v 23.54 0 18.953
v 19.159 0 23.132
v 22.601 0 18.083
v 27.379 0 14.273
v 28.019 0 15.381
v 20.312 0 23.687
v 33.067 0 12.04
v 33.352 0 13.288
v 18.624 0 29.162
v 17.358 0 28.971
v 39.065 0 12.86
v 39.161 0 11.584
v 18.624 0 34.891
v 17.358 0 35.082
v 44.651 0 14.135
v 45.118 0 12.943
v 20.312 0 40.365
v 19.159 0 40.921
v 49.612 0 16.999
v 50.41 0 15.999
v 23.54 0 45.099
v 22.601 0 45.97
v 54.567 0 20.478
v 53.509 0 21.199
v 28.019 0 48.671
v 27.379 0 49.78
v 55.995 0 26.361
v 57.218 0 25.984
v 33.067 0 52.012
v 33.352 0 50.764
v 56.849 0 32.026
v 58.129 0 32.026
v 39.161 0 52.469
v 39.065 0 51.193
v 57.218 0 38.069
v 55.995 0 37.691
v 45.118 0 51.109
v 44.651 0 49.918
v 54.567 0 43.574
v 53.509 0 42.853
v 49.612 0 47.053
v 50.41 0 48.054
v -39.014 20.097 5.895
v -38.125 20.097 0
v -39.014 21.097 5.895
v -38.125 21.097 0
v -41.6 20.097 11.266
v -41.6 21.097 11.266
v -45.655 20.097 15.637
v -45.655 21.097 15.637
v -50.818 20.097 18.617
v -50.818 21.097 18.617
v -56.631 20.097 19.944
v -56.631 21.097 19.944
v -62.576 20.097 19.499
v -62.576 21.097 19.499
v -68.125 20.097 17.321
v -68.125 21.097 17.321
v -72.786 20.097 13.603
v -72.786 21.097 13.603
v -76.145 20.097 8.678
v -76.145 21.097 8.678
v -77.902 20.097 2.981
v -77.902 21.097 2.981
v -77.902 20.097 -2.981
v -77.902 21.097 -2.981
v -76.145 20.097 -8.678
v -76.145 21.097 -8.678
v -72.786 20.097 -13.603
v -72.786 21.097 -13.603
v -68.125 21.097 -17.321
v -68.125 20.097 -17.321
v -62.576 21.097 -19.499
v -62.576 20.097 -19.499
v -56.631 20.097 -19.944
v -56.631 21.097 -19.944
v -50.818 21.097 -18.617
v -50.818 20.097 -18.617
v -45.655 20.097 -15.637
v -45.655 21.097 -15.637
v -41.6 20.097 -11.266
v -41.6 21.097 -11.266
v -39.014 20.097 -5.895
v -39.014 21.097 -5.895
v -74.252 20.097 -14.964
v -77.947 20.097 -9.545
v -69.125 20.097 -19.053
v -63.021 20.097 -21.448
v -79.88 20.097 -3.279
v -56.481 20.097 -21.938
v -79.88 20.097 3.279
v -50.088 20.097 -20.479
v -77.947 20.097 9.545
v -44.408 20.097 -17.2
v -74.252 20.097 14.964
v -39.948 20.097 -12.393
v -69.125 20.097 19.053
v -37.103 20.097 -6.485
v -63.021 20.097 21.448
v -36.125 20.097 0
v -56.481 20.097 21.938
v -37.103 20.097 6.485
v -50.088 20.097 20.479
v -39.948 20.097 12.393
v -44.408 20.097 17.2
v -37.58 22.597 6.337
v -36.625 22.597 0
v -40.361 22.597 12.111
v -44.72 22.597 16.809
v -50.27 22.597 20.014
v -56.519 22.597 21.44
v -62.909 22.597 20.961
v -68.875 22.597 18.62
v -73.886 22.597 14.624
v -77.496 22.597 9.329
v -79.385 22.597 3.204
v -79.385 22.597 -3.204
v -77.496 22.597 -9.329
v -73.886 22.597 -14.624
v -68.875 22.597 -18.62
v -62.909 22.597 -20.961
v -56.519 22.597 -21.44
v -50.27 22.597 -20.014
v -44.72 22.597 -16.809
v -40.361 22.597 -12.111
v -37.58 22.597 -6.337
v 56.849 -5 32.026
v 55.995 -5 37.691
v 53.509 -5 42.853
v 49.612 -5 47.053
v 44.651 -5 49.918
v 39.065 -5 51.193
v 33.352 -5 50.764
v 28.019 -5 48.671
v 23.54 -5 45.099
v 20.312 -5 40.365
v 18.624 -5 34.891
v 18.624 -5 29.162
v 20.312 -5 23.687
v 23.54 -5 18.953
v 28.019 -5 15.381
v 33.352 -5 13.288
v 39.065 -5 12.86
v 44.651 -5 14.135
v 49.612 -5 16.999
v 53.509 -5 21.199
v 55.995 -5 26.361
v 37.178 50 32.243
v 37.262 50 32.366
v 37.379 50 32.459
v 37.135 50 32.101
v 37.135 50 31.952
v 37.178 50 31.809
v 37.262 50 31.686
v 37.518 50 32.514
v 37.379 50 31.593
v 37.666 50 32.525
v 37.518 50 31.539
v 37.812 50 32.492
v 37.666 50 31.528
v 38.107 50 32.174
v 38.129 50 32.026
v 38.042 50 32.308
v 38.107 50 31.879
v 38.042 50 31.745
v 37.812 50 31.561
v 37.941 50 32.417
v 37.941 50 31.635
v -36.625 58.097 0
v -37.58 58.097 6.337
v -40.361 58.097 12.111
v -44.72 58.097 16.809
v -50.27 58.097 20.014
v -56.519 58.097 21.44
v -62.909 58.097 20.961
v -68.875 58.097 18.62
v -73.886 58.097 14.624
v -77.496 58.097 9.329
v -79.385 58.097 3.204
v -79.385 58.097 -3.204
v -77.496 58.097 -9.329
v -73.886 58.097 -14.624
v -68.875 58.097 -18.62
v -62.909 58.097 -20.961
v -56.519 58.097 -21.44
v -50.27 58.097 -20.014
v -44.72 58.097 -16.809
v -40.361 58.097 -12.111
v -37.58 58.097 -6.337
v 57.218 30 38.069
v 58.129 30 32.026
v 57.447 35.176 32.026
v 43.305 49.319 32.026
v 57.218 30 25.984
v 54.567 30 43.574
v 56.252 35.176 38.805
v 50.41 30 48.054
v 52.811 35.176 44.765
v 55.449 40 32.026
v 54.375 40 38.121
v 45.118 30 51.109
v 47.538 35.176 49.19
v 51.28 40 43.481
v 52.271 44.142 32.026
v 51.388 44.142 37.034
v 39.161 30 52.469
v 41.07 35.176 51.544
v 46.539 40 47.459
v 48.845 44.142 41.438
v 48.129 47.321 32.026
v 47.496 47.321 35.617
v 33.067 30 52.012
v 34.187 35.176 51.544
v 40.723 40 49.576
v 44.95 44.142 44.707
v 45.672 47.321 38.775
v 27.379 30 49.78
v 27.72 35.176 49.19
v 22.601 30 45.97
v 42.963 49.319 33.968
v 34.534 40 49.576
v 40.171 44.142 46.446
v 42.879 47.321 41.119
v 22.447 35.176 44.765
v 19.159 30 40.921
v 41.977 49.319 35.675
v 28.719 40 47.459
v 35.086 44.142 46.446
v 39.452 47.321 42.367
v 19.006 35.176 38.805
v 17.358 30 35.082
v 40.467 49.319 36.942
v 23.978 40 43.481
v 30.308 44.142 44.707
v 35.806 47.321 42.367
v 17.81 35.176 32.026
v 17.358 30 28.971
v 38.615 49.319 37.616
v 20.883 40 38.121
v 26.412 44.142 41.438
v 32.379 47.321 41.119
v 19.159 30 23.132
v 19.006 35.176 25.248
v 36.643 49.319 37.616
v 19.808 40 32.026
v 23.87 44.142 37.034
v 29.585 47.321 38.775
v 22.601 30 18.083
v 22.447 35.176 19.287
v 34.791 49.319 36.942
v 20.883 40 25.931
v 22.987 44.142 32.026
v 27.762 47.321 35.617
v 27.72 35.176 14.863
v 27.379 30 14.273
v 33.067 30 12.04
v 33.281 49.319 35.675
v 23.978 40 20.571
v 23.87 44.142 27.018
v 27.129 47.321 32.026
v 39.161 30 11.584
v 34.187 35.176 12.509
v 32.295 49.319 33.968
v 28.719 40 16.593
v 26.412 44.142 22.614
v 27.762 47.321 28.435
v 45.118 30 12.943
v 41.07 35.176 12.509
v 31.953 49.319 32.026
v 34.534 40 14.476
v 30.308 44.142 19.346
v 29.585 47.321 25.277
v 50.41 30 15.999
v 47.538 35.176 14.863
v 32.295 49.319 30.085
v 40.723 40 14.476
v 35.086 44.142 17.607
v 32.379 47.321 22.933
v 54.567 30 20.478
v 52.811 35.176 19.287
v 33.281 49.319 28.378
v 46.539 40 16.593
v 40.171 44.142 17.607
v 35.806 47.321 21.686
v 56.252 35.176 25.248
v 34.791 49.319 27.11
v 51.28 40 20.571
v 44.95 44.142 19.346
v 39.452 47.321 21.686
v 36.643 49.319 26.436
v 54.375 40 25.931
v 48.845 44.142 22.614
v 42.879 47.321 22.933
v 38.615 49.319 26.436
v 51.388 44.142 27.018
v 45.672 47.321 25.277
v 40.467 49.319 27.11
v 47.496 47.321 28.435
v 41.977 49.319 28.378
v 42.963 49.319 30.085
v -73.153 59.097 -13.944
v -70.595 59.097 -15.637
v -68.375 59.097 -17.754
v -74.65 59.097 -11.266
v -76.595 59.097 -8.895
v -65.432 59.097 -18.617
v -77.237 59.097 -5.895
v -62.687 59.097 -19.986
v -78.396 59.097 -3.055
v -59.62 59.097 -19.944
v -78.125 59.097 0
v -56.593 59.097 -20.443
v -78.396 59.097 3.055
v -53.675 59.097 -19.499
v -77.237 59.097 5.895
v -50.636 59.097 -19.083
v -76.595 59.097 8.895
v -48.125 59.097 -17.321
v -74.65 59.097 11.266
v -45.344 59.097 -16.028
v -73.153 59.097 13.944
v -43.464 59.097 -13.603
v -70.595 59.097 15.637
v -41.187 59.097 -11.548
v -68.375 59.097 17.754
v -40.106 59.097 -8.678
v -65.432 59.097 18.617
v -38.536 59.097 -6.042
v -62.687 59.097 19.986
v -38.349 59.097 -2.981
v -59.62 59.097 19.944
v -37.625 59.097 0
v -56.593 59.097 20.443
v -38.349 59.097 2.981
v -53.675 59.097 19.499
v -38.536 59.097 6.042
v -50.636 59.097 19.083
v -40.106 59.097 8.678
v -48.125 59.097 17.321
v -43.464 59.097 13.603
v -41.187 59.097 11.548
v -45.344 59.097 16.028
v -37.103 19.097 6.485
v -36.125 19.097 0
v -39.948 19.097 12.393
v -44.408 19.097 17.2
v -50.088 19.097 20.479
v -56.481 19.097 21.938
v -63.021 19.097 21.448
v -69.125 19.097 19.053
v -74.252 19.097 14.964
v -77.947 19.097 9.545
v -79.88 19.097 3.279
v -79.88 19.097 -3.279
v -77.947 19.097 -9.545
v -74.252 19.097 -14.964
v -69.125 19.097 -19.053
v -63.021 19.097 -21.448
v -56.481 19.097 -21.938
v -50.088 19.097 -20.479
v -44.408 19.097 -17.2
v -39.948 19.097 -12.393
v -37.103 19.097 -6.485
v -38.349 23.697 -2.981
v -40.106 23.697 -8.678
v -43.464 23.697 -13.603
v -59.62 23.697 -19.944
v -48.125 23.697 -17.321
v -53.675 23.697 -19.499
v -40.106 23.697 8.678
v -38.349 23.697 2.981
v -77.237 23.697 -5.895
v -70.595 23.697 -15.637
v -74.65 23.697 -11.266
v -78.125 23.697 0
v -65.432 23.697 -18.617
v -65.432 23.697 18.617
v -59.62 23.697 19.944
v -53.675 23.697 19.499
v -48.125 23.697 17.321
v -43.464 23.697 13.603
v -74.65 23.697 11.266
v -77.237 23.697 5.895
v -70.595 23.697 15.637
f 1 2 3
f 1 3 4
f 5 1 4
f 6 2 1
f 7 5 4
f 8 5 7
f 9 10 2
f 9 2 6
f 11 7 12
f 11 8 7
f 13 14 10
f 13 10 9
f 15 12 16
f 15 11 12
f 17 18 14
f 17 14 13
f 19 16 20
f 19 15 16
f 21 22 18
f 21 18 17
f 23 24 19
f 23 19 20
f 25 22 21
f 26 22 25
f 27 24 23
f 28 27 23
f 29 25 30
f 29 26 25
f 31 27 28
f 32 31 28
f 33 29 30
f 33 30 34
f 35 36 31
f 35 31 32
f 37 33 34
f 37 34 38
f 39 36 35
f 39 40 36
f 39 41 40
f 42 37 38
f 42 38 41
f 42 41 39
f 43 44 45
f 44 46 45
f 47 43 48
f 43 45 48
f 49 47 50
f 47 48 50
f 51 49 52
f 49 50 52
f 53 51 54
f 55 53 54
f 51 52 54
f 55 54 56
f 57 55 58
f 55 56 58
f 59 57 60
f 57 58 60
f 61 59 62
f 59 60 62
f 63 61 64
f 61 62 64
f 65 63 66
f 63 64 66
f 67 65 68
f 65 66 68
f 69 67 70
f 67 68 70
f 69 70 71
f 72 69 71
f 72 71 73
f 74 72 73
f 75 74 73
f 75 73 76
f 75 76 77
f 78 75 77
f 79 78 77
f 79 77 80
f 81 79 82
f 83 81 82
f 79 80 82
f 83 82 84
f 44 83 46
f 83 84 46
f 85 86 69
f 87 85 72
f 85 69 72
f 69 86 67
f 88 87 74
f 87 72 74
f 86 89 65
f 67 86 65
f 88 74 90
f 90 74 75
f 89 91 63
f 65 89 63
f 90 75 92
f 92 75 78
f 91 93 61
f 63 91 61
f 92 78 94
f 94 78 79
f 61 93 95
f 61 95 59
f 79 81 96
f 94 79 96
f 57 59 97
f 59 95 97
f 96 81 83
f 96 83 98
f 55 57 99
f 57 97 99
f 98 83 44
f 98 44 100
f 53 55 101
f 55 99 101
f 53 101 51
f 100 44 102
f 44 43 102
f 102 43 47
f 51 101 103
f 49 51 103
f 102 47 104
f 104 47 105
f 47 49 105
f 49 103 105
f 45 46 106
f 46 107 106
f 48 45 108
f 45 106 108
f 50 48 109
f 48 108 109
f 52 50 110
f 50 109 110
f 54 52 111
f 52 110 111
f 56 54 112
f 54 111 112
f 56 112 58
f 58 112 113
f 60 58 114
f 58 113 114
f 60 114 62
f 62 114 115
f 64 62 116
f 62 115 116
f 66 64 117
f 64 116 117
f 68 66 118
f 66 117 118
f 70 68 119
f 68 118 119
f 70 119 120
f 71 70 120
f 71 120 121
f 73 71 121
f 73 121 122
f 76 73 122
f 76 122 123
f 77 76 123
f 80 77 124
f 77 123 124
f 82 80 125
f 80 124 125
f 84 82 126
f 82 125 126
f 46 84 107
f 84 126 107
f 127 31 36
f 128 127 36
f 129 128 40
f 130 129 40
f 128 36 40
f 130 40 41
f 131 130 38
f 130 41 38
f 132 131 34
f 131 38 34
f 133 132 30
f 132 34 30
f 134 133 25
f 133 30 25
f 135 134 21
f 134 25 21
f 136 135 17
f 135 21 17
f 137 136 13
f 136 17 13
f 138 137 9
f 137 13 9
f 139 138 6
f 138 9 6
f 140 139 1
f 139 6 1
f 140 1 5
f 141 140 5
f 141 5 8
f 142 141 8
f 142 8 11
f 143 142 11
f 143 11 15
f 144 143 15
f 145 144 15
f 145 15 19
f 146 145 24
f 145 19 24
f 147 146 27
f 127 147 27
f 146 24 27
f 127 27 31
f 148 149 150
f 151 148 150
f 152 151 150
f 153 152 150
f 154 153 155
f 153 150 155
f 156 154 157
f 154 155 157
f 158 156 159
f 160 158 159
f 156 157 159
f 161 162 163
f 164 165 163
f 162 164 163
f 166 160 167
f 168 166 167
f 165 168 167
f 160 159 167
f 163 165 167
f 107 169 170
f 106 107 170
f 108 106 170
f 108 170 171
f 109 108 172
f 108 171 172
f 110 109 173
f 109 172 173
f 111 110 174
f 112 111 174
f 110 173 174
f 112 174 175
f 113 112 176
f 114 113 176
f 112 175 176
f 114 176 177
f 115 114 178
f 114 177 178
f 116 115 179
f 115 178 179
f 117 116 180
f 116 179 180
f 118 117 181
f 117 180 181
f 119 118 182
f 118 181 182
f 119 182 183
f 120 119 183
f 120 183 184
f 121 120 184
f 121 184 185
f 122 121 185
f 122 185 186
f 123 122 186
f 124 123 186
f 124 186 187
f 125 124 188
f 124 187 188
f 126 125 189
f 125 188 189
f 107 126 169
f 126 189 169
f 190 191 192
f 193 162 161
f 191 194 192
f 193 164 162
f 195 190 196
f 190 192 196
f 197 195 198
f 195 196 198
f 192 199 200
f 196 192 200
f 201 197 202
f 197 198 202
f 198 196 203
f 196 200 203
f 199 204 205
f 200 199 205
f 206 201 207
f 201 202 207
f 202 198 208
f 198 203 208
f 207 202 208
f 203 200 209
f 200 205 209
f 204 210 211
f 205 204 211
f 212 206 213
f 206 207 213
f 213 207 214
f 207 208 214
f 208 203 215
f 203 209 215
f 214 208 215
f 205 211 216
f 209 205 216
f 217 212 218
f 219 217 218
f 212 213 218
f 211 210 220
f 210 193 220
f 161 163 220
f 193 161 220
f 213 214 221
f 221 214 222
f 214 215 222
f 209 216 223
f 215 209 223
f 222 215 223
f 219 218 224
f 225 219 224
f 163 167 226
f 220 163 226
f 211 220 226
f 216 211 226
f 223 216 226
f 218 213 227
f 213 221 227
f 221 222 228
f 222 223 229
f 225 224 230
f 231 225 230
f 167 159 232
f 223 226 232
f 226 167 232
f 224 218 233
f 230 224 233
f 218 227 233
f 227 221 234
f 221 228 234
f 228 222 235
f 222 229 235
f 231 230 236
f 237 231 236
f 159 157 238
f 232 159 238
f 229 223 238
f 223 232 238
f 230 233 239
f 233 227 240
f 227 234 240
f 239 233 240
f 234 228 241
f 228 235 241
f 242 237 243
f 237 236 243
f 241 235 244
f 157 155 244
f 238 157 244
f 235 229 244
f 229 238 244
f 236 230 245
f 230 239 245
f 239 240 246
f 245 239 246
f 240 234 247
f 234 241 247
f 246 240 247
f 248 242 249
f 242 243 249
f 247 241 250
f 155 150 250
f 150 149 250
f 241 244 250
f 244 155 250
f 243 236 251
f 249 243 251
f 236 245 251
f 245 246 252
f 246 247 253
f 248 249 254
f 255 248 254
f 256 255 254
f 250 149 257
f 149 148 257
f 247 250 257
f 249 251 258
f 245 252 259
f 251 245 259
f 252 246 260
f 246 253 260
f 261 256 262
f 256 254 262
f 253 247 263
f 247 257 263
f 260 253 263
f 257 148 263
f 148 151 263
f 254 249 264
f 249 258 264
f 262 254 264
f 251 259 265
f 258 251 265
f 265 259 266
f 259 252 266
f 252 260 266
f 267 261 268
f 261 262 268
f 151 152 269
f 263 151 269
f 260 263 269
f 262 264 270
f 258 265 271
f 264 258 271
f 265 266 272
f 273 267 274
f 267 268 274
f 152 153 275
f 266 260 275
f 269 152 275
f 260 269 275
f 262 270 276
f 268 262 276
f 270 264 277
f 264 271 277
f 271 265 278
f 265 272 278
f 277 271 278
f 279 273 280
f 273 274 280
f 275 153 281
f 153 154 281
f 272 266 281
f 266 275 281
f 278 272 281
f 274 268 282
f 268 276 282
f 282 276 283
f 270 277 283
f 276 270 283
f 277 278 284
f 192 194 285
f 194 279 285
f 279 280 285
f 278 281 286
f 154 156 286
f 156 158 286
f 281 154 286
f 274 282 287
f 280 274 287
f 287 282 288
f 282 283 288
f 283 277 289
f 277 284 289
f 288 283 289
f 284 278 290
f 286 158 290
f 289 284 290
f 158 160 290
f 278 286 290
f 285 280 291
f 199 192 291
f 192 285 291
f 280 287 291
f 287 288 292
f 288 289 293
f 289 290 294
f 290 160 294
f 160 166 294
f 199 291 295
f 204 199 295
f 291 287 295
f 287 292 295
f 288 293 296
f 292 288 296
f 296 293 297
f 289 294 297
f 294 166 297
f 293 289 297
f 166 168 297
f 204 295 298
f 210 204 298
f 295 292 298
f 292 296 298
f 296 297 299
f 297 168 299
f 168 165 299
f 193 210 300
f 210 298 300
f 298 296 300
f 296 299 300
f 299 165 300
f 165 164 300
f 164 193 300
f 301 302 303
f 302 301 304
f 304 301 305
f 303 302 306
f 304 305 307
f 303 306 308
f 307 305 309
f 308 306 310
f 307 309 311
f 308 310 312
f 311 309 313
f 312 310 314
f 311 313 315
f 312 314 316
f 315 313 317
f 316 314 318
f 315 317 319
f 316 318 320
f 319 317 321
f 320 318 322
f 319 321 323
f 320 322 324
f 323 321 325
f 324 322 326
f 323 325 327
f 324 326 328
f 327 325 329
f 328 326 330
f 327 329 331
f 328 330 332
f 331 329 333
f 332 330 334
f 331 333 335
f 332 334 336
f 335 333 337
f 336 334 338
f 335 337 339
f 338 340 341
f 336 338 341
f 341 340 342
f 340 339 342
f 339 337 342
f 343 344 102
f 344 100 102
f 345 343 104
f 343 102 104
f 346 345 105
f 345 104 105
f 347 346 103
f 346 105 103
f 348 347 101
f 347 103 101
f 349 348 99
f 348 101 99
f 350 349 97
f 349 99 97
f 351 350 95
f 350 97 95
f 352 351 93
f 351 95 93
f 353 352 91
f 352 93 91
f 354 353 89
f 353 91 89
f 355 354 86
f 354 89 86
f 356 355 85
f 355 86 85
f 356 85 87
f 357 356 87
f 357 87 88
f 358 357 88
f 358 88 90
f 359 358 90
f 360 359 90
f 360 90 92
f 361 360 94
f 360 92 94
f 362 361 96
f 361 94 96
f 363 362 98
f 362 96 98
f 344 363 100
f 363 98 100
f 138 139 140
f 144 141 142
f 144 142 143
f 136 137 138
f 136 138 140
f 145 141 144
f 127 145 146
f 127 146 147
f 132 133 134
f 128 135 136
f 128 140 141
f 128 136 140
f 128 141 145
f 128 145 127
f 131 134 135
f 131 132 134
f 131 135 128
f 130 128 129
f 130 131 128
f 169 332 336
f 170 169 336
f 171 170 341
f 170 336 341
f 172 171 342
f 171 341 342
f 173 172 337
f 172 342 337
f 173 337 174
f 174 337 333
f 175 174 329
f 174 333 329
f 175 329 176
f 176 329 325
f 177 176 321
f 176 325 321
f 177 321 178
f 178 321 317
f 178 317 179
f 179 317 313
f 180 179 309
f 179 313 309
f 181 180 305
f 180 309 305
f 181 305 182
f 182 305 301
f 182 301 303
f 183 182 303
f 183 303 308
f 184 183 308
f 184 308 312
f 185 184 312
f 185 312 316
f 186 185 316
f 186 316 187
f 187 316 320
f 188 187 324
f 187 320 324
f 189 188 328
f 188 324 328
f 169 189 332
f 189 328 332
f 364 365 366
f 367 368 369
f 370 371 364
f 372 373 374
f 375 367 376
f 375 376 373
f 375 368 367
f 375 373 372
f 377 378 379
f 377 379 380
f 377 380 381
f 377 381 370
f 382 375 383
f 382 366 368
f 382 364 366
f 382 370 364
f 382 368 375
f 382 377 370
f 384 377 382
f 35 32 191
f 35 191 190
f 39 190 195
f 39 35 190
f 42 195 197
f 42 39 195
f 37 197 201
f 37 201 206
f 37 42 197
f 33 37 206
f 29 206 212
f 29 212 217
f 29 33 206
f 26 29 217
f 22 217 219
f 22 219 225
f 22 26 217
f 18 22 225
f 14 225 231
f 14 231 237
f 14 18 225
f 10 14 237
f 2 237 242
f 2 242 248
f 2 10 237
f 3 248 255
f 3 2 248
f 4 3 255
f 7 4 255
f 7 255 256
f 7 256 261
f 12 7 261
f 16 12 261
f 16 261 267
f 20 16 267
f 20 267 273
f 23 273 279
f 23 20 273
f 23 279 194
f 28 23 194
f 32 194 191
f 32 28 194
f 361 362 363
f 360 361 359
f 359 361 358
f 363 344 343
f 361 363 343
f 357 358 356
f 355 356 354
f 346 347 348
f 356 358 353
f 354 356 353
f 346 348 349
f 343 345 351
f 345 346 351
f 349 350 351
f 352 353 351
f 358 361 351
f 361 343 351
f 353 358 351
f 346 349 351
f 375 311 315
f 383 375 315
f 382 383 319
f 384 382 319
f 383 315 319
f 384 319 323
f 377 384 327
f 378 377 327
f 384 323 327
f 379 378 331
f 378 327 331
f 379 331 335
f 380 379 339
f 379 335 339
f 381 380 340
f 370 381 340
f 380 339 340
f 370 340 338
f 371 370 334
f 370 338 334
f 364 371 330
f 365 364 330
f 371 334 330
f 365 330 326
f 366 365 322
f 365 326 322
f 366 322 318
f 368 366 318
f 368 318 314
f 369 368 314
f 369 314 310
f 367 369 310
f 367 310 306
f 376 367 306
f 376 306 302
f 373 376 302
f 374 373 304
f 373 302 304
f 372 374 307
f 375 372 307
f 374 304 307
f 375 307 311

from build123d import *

# Parameters (mm, degrees)
F3_R      = 20
F4_DEPTH  = 35.4
F5_SIZE   = 1
F6_R      = 20.5
F7_DEPTH  = 50
F8_R      = 20
F9_R      = 19.2200418253
F10_DEPTH = 5


with BuildPart() as f2:
    # F0 (on Top) → F2 (revolve)
    with BuildSketch(Plane.XY):
        Polygon((-36.6252385923, 22.5971317332), (-36.6252385923, 52.5971317332), (-36.6252385923, 59.0971317332), (-58.1252385923, 59.0971317332), (-58.1252385923, 19.0971317332), (-38.1252385923, 19.0971317332), (-36.1252385923, 19.0971317332), (-36.1252385923, 20.0971317332), (-38.1252385923, 20.0971317332), (-38.1252385923, 21.0971317332), align=None)
    revolve(axis=Axis((-58.1252385923, 40.6790506285, 0), (0, -1, 0)))

    # F3 (on face) → F4 (cut)
    with BuildSketch(Plane(origin=(0, 59.0971317332, 0), x_dir=(-1, 0, 0), z_dir=(0, 1, 0))):
        with Locations((58.1252385923, 0)):
            Circle(F3_R)
    extrude(amount=-F4_DEPTH, mode=Mode.SUBTRACT)

    # F5
    f5_edges = [f2.edges().sort_by_distance(p)[0] for p in [
        (-79.625239, 59.097132, 0),
    ]]
    chamfer(f5_edges, length=F5_SIZE)


with BuildPart() as f7:
    # F6 (on Front) → F7 (new body)
    with BuildSketch(Plane.XZ):
        with Locations((37.6289188862, 32.0262089372)):
            Circle(F6_R)
    extrude(amount=-F7_DEPTH)

    # F8
    f8_edges = [f7.edges().sort_by_distance(p)[0] for p in [
        (17.128919, 50, 32.026209),
    ]]
    fillet(f8_edges, radius=F8_R)

    # F9 (on face) → F10 (join)
    with BuildSketch(Plane.XZ):
        with Locations((37.6289188862, 32.0262089372)):
            Circle(F9_R)
    extrude(amount=F10_DEPTH)


solid = Compound([f2.part, f7.part])
